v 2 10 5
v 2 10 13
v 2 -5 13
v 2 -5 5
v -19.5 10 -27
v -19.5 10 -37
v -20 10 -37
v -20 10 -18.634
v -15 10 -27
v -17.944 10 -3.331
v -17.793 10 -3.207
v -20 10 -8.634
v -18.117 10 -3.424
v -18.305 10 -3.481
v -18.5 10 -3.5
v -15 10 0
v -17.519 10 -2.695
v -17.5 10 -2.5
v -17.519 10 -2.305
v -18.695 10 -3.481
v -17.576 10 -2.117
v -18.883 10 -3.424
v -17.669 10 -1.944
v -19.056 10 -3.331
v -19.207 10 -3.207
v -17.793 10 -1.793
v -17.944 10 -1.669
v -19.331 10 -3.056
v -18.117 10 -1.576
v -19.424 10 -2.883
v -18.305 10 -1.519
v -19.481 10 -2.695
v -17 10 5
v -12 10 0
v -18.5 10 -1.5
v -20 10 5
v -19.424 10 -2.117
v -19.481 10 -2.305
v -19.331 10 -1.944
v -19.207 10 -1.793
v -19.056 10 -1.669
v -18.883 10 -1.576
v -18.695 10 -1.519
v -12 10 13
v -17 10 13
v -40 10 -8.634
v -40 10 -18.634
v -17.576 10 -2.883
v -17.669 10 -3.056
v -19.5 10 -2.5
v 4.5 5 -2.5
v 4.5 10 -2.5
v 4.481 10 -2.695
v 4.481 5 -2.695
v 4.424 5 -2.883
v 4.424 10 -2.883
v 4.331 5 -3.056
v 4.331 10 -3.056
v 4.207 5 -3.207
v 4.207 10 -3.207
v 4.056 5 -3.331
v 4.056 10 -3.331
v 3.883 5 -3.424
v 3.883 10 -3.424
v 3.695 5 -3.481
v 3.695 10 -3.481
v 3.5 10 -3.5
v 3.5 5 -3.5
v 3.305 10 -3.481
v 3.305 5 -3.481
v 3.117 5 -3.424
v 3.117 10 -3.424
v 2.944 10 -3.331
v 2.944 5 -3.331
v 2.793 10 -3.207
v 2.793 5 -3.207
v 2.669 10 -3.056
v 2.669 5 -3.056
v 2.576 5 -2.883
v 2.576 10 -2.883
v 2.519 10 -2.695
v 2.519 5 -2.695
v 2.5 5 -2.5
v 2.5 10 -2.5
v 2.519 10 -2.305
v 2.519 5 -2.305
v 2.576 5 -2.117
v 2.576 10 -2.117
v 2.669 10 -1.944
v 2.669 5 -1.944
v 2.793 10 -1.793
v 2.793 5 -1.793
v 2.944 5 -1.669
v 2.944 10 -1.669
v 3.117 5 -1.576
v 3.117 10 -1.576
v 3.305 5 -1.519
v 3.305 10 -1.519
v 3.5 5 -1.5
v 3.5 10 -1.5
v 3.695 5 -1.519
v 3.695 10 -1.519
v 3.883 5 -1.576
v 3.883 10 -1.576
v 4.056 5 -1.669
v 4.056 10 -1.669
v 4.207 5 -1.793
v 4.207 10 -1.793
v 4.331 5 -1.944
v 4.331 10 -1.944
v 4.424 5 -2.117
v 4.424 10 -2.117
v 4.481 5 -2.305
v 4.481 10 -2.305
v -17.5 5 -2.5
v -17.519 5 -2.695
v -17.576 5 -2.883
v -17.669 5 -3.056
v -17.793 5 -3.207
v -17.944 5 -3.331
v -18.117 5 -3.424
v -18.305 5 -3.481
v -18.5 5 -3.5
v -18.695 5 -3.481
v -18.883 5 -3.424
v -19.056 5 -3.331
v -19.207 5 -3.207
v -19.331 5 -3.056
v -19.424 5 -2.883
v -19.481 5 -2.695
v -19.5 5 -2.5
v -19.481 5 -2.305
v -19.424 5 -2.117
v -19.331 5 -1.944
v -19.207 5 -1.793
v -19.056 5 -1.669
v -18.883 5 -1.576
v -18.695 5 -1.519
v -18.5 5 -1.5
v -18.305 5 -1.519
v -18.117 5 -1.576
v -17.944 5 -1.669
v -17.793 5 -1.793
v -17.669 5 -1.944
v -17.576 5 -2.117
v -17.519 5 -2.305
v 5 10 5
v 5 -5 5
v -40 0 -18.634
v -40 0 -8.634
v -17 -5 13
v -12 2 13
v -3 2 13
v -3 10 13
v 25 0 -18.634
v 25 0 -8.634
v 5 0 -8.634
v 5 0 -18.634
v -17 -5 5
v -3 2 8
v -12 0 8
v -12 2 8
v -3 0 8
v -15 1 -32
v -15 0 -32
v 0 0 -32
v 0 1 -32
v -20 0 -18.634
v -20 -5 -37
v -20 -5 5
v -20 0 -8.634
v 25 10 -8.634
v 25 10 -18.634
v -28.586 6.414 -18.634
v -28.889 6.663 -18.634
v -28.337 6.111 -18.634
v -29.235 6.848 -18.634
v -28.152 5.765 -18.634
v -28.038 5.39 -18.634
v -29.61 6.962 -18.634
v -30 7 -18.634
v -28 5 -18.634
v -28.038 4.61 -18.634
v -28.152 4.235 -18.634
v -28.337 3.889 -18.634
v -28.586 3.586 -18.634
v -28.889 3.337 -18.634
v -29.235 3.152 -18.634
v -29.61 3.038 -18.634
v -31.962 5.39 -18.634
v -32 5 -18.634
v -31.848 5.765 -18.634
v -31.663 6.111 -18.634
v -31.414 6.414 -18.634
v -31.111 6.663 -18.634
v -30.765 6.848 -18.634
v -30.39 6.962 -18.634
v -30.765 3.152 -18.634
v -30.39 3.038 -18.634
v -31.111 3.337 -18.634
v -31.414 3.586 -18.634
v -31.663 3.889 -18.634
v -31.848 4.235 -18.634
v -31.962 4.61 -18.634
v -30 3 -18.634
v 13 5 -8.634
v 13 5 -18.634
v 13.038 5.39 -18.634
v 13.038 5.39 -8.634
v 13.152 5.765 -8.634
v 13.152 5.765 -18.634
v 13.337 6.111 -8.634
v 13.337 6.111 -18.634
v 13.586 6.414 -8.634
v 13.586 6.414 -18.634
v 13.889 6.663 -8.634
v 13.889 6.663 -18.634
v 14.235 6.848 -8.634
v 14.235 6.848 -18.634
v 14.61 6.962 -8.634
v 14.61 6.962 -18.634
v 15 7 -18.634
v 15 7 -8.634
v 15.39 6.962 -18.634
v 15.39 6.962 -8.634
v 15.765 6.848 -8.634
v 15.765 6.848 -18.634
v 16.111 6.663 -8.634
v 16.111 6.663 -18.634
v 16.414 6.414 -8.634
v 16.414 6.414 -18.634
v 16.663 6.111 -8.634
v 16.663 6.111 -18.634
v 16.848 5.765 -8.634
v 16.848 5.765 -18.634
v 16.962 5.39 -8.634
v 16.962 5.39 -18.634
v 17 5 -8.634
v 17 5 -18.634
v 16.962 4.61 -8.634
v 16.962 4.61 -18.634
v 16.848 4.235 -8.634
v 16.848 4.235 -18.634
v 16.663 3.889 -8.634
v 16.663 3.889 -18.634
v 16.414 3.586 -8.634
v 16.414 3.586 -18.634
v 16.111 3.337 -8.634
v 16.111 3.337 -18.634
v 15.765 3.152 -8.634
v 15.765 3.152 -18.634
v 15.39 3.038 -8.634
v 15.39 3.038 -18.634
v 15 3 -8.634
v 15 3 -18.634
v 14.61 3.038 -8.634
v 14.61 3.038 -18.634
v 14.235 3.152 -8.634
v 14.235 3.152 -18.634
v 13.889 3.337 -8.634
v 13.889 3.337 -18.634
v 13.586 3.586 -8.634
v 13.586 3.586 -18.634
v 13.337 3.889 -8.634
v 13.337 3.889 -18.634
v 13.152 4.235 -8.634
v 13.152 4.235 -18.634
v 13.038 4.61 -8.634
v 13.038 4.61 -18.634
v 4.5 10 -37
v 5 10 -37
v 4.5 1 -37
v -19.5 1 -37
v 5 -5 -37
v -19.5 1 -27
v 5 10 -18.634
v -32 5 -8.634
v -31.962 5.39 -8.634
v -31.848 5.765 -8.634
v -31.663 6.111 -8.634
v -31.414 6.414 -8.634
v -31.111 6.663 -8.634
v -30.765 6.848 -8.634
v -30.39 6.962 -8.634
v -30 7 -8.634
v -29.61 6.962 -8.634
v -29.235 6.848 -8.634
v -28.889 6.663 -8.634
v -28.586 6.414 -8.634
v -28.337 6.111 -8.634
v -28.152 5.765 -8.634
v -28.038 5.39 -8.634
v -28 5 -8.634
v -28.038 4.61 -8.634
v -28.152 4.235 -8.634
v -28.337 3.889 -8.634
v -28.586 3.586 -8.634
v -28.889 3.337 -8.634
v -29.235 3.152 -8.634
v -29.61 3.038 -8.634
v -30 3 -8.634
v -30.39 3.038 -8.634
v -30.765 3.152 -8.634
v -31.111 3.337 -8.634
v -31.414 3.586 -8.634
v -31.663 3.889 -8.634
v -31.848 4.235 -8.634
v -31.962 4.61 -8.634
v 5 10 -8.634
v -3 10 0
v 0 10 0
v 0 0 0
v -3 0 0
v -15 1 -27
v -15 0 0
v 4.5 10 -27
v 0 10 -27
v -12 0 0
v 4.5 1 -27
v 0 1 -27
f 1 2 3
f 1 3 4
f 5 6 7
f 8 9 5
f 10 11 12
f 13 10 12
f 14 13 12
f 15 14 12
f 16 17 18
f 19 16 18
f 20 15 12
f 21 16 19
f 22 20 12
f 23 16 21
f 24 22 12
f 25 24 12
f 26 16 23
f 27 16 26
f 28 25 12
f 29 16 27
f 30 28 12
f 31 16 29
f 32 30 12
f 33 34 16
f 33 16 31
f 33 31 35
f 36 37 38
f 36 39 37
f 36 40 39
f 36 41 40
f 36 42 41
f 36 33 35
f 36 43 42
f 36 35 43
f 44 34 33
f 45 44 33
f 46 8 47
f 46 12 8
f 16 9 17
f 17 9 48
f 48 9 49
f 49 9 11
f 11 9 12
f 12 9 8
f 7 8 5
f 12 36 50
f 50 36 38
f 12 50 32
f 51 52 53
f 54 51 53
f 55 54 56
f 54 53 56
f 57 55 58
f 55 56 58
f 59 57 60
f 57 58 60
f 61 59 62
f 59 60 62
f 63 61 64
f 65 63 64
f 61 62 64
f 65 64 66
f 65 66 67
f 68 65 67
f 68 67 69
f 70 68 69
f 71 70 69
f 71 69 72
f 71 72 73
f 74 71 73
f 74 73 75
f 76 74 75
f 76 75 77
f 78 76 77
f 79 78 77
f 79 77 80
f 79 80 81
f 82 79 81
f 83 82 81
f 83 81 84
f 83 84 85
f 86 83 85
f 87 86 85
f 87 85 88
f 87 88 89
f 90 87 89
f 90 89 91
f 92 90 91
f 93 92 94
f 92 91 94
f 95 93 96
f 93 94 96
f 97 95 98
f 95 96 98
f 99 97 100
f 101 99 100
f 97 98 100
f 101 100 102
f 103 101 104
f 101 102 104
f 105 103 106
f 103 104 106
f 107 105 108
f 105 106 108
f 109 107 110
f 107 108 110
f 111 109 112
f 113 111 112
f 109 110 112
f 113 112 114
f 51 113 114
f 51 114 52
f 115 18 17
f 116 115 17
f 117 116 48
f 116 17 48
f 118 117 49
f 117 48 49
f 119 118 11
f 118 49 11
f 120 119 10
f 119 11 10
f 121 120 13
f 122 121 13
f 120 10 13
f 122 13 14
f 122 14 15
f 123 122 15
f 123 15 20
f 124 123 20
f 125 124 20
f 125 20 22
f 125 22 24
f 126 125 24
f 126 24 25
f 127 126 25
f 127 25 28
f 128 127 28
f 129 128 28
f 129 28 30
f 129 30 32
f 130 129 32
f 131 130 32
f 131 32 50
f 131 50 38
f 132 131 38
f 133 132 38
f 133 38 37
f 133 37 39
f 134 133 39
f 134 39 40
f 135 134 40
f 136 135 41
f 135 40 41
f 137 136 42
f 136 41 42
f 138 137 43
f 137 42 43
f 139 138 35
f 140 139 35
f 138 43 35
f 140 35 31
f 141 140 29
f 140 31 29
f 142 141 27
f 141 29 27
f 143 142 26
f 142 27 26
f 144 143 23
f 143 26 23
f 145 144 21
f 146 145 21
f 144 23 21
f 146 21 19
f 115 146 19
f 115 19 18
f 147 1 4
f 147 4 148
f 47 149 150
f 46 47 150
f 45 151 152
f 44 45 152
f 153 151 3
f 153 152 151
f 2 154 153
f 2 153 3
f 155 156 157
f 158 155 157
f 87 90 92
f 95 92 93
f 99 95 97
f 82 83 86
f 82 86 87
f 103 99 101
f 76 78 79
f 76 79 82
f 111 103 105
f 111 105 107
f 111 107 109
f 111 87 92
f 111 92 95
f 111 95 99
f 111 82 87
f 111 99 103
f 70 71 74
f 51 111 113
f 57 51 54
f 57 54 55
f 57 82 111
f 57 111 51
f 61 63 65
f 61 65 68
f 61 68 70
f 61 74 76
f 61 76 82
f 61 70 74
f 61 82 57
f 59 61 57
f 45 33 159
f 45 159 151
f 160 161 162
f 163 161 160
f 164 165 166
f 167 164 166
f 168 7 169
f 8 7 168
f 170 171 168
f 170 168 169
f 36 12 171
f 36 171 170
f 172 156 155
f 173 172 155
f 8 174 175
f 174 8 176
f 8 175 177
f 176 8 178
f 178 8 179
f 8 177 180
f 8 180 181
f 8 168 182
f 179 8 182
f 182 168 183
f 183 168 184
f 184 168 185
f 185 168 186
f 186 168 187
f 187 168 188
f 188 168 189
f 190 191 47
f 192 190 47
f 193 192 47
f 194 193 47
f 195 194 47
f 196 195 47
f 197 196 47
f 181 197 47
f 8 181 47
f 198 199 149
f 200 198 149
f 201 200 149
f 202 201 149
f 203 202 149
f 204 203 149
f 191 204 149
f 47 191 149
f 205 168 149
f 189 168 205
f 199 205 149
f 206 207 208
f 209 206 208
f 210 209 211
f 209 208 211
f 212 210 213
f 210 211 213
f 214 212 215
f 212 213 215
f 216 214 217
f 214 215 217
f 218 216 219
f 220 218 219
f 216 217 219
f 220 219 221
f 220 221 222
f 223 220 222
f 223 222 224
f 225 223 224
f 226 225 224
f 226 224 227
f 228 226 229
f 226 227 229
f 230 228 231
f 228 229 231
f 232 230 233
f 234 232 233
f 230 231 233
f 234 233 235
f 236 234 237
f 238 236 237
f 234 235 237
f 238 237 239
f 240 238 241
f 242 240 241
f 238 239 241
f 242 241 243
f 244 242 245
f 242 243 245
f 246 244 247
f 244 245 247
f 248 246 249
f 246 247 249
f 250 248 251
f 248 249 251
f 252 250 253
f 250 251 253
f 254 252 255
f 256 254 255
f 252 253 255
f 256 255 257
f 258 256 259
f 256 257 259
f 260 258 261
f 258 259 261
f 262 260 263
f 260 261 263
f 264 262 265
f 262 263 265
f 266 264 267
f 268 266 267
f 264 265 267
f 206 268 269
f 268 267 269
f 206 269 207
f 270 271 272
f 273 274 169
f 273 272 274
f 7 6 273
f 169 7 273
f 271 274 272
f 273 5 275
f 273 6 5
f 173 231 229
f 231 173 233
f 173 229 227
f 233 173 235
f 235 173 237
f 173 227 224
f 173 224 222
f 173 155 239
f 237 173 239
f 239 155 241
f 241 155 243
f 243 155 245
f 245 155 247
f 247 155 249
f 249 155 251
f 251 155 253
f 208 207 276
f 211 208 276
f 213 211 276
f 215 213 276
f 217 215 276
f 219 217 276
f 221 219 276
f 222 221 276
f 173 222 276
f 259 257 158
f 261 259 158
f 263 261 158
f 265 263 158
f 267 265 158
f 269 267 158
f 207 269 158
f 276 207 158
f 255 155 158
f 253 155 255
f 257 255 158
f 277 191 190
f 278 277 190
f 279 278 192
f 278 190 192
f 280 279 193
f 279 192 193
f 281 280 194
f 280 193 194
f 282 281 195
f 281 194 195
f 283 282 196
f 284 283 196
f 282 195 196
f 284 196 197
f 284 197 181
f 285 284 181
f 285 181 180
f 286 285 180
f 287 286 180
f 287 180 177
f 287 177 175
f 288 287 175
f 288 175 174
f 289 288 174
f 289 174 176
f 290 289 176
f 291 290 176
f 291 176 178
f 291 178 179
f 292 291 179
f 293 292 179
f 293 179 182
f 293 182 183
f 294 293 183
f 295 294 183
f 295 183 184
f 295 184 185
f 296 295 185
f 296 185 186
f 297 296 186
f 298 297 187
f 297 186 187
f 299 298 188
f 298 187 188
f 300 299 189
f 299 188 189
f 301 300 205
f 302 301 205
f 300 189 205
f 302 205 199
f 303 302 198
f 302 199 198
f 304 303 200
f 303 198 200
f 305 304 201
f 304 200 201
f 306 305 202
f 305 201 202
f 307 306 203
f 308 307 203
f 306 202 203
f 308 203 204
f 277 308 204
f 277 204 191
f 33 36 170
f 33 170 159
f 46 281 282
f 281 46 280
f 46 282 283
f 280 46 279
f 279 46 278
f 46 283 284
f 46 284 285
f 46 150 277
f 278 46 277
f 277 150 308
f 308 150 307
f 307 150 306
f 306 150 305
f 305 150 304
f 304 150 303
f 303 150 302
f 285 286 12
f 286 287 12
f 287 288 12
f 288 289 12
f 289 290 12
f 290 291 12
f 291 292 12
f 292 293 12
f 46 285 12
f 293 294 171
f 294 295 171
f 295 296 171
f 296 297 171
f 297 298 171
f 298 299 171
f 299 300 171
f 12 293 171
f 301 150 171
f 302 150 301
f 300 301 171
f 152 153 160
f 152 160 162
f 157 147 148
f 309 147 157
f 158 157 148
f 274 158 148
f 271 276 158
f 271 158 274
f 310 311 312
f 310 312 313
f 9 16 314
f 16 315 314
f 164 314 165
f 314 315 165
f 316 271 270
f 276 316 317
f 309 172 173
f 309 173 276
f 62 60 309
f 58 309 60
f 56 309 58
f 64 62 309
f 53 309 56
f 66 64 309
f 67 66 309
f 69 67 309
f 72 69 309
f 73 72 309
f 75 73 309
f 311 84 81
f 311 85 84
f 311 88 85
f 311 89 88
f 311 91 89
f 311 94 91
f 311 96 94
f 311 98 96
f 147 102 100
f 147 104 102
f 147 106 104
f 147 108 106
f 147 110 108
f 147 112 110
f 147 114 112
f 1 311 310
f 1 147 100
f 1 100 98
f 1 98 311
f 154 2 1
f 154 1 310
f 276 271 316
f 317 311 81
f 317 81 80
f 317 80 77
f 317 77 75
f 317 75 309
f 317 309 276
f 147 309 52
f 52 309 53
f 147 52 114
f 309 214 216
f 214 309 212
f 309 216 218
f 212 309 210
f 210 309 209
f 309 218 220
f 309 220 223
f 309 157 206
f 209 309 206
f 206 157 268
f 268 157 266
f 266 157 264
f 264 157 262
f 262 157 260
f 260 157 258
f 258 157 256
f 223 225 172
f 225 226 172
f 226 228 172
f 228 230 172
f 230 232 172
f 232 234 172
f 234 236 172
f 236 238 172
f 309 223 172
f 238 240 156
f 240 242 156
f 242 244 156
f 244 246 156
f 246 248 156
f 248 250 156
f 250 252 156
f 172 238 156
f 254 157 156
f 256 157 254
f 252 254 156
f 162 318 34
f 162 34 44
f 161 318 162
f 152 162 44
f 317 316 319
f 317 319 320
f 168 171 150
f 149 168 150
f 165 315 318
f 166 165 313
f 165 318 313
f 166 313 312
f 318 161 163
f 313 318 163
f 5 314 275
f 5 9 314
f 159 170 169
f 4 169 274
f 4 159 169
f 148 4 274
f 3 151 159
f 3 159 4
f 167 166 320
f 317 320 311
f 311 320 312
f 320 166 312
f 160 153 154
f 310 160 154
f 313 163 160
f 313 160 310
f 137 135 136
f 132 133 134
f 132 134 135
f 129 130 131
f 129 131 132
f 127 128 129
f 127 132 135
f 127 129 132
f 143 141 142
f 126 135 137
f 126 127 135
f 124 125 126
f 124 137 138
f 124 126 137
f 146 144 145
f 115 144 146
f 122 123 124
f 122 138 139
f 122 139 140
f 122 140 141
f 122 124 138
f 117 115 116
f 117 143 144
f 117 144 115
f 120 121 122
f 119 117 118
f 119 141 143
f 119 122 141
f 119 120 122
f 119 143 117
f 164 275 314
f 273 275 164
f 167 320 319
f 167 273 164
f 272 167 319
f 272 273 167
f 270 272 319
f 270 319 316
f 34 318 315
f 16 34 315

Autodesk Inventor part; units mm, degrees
ref_plane "YZ Plane" through (0, 0, 0) normal (1, 0, 0) x (0, 1, 0)
ref_plane "XZ Plane" through (0, 0, 0) normal (0, 1, 0) x (-1, 0, 0)
ref_plane "XY Plane" through (0, 0, 0) normal (0, 0, 1) x (1, 0, 0)
sketch "Sketch1" plane through (0, 0, 0) normal (0, 1, 0) x (-1, 0, 0)
  line L0 (0, 0) -> (15, 0)
  line L1 (15, 0) -> (15, -32)
  line L2 (15, -32) -> (0, -32)
  line L3 (0, -32) -> (0, 0)
  line L4 (3, 0) -> (12, 0)
  line L5 (12, 0) -> (12, 8)
  line L6 (12, 8) -> (3, 8)
  line L7 (3, 8) -> (3, 0)
  line L8 (-5, -32) -> (-5, 5)
  line L9 (-5, 5) -> (-2, 5)
  line L10 (-2, 5) -> (-2, 13)
  line L11 (-2, 13) -> (17, 13)
  line L12 (17, 13) -> (17, 5)
  line L13 (17, 5) -> (20, 5)
  line L14 (20, 5) -> (20, -37)
  line L15 (20, -37) -> (-5, -37)
  line L16 (-5, -37) -> (-5, -32)
  line L17 (-5, -8.634) -> (-25, -8.634)
  line L18 (-25, -8.634) -> (-25, -18.634)
  line L19 (-25, -18.634) -> (-5, -18.634)
  line L20 (-5, -18.634) -> (-5, -8.634)
  line L21 (20, -18.634) -> (40, -18.634)
  line L22 (40, -18.634) -> (40, -8.634)
  line L23 (40, -8.634) -> (20, -8.634)
  line L24 (20, -8.634) -> (20, -18.634)
  dimension "d0" = 15
  dimension "d1" = 32
  dimension "d2" = 9
  dimension "d3" = 3
  dimension "d4" = 3
  dimension "d5" = 8
  dimension "d6" = 5
  dimension "d7" = 5
  dimension "d8" = 5
  dimension "d9" = 5
  dimension "d10" = 5
  dimension "d11" = 5
  dimension "d12" = 5
  dimension "d13" = 5
  dimension "d71" = 20
  dimension "d72" = 10
  dimension "d73" = 20
  dimension "d74" = 10
extrude "Extrusion1" add sketch "Sketch1" along normal blind 10
sketch "Sketch3" plane through (5, 0, -37) normal (0, 0, -1) x (-1, 0, 0)
  line L0 (0.5, 10) -> (24.5, 10)
  line L1 (24.5, 10) -> (24.5, 1)
  line L2 (24.5, 1) -> (0.5, 1)
  line L3 (0.5, 1) -> (0.5, 10)
  line L4 (25, 0) -> (25, 10) projected
  line L5 (0, 0) -> (0, 10) projected
  line L6 (0, 0) -> (25, 0) projected
  line L7 (0, 10) -> (25, 10) projected
  point P0 (5, 0)
  point P1 (24.5, 5.5)
  dimension "d24" = 0.5
  dimension "d25" = 0.5
  dimension "d26" = 1
  dimension "d27" = 0
extrude "Extrusion3" cut sketch "Sketch3" against normal blind 10 contours L0 L1 L2 L3
sketch "Sketch4" plane through (-17, 0, 13) normal (0, 0, 1) x (1, 0, 0)
  line L0 (5, 10) -> (14, 10)
  line L1 (14, 10) -> (14, 2)
  line L2 (14, 2) -> (5, 2)
  line L3 (5, 2) -> (5, 10)
  line L4 (0, 0) -> (19, 0) projected
  line L5 (0, 10) -> (19, 10) projected
  line L6 (19, 0) -> (19, 10) projected
  line L7 (0, 0) -> (0, 10) projected
  point P0 (17, 0)
  point P1 (9.5, 0)
  dimension "d30" = 2
  dimension "d31" = 0
  dimension "d32" = 5
  dimension "d33" = 5
extrude "Extrusion4" cut sketch "Sketch4" against normal blind 10 contours L0 L1 L2 L3
sketch "Sketch5" plane through (0, 0, 0) normal (0, -1, 0) x (1, 0, 0)
  line L0 (-17, 5) -> (-17, 13) projected
  line L1 (2, 13) -> (2, 5) projected
  line L2 (-17, 13) -> (2, 13)
  line L3 (2, 13) -> (2, 5)
  line L4 (5, 5) -> (5, -37) projected
  line L5 (2, 5) -> (5, 5)
  line L6 (5, 5) -> (5, -37)
  line L7 (-20, -37) -> (-20, 5) projected
  line L8 (5, -37) -> (-20, -37)
  line L9 (-20, -37) -> (-20, 5)
  line L10 (-20, 5) -> (-17, 5)
  point P0 (0, 0)
extrude "Extrusion5" add sketch "Sketch5" along normal blind 5
sketch "Sketch6" plane through (0, 10, 0) normal (0, 1, 0) x (1, 0, 0)
  circle A0 centre (-18.5, 2.5) radius 1
  line L0 (-20, -5) -> (-17, -5) projected
  line L1 (-20, 37) -> (-20, -5) projected
  circle A1 centre (3.5, 2.5) radius 1
  line L2 (2, -5) -> (5, -5) projected
  line L3 (2, -13) -> (2, -5) projected
  point P0 (0, 0)
  dimension "d59" = 2
  dimension "d60" = 7.5
  dimension "d61" = 1.5
  dimension "d62" = 2
  dimension "d63" = 7.5
  dimension "d64" = 1.5
extrude "Extrusion6" cut sketch "Sketch6" against normal blind 5
thread "Thread1" size "M2x0.4" class "6H" standard "ANSI Metric M Profile" full length
thread "Thread2" size "M2x0.4" class "6H" standard "ANSI Metric M Profile" full length
sketch "Sketch7" plane through (25, 0, -18.634) normal (0, 0, -1) x (-1, 0, 0)
  point P0 (25, 0)
sketch "Sketch8" plane through (25, 0, -18.634) normal (0, 0, -1) x (-1, 0, 0)
  circle A0 centre (10, 5) radius 2
  circle A1 centre (55, 5) radius 2
  line L0 (65, 0) -> (65, 10) projected
  line L1 (0, 0) -> (0, 10) projected
  line L2 (0, 10) -> (20, 10) projected
  line L3 (45, 10) -> (65, 10) projected
  point P0 (25, 0)
  point P1 (65, 5)
  dimension "d76" = 4
  dimension "d77" = 4
  dimension "d78" = 10
  dimension "d79" = 10
  dimension "d80" = 5
  dimension "d81" = 5
extrude "Extrusion7" cut sketch "Sketch8" against normal blind 10
thread "Thread3" size "M4x0.7" class "6H" standard "ANSI Metric M Profile" full length
thread "Thread4" size "M4x0.7" class "6H" standard "ANSI Metric M Profile" full length
properties part number "Base"
